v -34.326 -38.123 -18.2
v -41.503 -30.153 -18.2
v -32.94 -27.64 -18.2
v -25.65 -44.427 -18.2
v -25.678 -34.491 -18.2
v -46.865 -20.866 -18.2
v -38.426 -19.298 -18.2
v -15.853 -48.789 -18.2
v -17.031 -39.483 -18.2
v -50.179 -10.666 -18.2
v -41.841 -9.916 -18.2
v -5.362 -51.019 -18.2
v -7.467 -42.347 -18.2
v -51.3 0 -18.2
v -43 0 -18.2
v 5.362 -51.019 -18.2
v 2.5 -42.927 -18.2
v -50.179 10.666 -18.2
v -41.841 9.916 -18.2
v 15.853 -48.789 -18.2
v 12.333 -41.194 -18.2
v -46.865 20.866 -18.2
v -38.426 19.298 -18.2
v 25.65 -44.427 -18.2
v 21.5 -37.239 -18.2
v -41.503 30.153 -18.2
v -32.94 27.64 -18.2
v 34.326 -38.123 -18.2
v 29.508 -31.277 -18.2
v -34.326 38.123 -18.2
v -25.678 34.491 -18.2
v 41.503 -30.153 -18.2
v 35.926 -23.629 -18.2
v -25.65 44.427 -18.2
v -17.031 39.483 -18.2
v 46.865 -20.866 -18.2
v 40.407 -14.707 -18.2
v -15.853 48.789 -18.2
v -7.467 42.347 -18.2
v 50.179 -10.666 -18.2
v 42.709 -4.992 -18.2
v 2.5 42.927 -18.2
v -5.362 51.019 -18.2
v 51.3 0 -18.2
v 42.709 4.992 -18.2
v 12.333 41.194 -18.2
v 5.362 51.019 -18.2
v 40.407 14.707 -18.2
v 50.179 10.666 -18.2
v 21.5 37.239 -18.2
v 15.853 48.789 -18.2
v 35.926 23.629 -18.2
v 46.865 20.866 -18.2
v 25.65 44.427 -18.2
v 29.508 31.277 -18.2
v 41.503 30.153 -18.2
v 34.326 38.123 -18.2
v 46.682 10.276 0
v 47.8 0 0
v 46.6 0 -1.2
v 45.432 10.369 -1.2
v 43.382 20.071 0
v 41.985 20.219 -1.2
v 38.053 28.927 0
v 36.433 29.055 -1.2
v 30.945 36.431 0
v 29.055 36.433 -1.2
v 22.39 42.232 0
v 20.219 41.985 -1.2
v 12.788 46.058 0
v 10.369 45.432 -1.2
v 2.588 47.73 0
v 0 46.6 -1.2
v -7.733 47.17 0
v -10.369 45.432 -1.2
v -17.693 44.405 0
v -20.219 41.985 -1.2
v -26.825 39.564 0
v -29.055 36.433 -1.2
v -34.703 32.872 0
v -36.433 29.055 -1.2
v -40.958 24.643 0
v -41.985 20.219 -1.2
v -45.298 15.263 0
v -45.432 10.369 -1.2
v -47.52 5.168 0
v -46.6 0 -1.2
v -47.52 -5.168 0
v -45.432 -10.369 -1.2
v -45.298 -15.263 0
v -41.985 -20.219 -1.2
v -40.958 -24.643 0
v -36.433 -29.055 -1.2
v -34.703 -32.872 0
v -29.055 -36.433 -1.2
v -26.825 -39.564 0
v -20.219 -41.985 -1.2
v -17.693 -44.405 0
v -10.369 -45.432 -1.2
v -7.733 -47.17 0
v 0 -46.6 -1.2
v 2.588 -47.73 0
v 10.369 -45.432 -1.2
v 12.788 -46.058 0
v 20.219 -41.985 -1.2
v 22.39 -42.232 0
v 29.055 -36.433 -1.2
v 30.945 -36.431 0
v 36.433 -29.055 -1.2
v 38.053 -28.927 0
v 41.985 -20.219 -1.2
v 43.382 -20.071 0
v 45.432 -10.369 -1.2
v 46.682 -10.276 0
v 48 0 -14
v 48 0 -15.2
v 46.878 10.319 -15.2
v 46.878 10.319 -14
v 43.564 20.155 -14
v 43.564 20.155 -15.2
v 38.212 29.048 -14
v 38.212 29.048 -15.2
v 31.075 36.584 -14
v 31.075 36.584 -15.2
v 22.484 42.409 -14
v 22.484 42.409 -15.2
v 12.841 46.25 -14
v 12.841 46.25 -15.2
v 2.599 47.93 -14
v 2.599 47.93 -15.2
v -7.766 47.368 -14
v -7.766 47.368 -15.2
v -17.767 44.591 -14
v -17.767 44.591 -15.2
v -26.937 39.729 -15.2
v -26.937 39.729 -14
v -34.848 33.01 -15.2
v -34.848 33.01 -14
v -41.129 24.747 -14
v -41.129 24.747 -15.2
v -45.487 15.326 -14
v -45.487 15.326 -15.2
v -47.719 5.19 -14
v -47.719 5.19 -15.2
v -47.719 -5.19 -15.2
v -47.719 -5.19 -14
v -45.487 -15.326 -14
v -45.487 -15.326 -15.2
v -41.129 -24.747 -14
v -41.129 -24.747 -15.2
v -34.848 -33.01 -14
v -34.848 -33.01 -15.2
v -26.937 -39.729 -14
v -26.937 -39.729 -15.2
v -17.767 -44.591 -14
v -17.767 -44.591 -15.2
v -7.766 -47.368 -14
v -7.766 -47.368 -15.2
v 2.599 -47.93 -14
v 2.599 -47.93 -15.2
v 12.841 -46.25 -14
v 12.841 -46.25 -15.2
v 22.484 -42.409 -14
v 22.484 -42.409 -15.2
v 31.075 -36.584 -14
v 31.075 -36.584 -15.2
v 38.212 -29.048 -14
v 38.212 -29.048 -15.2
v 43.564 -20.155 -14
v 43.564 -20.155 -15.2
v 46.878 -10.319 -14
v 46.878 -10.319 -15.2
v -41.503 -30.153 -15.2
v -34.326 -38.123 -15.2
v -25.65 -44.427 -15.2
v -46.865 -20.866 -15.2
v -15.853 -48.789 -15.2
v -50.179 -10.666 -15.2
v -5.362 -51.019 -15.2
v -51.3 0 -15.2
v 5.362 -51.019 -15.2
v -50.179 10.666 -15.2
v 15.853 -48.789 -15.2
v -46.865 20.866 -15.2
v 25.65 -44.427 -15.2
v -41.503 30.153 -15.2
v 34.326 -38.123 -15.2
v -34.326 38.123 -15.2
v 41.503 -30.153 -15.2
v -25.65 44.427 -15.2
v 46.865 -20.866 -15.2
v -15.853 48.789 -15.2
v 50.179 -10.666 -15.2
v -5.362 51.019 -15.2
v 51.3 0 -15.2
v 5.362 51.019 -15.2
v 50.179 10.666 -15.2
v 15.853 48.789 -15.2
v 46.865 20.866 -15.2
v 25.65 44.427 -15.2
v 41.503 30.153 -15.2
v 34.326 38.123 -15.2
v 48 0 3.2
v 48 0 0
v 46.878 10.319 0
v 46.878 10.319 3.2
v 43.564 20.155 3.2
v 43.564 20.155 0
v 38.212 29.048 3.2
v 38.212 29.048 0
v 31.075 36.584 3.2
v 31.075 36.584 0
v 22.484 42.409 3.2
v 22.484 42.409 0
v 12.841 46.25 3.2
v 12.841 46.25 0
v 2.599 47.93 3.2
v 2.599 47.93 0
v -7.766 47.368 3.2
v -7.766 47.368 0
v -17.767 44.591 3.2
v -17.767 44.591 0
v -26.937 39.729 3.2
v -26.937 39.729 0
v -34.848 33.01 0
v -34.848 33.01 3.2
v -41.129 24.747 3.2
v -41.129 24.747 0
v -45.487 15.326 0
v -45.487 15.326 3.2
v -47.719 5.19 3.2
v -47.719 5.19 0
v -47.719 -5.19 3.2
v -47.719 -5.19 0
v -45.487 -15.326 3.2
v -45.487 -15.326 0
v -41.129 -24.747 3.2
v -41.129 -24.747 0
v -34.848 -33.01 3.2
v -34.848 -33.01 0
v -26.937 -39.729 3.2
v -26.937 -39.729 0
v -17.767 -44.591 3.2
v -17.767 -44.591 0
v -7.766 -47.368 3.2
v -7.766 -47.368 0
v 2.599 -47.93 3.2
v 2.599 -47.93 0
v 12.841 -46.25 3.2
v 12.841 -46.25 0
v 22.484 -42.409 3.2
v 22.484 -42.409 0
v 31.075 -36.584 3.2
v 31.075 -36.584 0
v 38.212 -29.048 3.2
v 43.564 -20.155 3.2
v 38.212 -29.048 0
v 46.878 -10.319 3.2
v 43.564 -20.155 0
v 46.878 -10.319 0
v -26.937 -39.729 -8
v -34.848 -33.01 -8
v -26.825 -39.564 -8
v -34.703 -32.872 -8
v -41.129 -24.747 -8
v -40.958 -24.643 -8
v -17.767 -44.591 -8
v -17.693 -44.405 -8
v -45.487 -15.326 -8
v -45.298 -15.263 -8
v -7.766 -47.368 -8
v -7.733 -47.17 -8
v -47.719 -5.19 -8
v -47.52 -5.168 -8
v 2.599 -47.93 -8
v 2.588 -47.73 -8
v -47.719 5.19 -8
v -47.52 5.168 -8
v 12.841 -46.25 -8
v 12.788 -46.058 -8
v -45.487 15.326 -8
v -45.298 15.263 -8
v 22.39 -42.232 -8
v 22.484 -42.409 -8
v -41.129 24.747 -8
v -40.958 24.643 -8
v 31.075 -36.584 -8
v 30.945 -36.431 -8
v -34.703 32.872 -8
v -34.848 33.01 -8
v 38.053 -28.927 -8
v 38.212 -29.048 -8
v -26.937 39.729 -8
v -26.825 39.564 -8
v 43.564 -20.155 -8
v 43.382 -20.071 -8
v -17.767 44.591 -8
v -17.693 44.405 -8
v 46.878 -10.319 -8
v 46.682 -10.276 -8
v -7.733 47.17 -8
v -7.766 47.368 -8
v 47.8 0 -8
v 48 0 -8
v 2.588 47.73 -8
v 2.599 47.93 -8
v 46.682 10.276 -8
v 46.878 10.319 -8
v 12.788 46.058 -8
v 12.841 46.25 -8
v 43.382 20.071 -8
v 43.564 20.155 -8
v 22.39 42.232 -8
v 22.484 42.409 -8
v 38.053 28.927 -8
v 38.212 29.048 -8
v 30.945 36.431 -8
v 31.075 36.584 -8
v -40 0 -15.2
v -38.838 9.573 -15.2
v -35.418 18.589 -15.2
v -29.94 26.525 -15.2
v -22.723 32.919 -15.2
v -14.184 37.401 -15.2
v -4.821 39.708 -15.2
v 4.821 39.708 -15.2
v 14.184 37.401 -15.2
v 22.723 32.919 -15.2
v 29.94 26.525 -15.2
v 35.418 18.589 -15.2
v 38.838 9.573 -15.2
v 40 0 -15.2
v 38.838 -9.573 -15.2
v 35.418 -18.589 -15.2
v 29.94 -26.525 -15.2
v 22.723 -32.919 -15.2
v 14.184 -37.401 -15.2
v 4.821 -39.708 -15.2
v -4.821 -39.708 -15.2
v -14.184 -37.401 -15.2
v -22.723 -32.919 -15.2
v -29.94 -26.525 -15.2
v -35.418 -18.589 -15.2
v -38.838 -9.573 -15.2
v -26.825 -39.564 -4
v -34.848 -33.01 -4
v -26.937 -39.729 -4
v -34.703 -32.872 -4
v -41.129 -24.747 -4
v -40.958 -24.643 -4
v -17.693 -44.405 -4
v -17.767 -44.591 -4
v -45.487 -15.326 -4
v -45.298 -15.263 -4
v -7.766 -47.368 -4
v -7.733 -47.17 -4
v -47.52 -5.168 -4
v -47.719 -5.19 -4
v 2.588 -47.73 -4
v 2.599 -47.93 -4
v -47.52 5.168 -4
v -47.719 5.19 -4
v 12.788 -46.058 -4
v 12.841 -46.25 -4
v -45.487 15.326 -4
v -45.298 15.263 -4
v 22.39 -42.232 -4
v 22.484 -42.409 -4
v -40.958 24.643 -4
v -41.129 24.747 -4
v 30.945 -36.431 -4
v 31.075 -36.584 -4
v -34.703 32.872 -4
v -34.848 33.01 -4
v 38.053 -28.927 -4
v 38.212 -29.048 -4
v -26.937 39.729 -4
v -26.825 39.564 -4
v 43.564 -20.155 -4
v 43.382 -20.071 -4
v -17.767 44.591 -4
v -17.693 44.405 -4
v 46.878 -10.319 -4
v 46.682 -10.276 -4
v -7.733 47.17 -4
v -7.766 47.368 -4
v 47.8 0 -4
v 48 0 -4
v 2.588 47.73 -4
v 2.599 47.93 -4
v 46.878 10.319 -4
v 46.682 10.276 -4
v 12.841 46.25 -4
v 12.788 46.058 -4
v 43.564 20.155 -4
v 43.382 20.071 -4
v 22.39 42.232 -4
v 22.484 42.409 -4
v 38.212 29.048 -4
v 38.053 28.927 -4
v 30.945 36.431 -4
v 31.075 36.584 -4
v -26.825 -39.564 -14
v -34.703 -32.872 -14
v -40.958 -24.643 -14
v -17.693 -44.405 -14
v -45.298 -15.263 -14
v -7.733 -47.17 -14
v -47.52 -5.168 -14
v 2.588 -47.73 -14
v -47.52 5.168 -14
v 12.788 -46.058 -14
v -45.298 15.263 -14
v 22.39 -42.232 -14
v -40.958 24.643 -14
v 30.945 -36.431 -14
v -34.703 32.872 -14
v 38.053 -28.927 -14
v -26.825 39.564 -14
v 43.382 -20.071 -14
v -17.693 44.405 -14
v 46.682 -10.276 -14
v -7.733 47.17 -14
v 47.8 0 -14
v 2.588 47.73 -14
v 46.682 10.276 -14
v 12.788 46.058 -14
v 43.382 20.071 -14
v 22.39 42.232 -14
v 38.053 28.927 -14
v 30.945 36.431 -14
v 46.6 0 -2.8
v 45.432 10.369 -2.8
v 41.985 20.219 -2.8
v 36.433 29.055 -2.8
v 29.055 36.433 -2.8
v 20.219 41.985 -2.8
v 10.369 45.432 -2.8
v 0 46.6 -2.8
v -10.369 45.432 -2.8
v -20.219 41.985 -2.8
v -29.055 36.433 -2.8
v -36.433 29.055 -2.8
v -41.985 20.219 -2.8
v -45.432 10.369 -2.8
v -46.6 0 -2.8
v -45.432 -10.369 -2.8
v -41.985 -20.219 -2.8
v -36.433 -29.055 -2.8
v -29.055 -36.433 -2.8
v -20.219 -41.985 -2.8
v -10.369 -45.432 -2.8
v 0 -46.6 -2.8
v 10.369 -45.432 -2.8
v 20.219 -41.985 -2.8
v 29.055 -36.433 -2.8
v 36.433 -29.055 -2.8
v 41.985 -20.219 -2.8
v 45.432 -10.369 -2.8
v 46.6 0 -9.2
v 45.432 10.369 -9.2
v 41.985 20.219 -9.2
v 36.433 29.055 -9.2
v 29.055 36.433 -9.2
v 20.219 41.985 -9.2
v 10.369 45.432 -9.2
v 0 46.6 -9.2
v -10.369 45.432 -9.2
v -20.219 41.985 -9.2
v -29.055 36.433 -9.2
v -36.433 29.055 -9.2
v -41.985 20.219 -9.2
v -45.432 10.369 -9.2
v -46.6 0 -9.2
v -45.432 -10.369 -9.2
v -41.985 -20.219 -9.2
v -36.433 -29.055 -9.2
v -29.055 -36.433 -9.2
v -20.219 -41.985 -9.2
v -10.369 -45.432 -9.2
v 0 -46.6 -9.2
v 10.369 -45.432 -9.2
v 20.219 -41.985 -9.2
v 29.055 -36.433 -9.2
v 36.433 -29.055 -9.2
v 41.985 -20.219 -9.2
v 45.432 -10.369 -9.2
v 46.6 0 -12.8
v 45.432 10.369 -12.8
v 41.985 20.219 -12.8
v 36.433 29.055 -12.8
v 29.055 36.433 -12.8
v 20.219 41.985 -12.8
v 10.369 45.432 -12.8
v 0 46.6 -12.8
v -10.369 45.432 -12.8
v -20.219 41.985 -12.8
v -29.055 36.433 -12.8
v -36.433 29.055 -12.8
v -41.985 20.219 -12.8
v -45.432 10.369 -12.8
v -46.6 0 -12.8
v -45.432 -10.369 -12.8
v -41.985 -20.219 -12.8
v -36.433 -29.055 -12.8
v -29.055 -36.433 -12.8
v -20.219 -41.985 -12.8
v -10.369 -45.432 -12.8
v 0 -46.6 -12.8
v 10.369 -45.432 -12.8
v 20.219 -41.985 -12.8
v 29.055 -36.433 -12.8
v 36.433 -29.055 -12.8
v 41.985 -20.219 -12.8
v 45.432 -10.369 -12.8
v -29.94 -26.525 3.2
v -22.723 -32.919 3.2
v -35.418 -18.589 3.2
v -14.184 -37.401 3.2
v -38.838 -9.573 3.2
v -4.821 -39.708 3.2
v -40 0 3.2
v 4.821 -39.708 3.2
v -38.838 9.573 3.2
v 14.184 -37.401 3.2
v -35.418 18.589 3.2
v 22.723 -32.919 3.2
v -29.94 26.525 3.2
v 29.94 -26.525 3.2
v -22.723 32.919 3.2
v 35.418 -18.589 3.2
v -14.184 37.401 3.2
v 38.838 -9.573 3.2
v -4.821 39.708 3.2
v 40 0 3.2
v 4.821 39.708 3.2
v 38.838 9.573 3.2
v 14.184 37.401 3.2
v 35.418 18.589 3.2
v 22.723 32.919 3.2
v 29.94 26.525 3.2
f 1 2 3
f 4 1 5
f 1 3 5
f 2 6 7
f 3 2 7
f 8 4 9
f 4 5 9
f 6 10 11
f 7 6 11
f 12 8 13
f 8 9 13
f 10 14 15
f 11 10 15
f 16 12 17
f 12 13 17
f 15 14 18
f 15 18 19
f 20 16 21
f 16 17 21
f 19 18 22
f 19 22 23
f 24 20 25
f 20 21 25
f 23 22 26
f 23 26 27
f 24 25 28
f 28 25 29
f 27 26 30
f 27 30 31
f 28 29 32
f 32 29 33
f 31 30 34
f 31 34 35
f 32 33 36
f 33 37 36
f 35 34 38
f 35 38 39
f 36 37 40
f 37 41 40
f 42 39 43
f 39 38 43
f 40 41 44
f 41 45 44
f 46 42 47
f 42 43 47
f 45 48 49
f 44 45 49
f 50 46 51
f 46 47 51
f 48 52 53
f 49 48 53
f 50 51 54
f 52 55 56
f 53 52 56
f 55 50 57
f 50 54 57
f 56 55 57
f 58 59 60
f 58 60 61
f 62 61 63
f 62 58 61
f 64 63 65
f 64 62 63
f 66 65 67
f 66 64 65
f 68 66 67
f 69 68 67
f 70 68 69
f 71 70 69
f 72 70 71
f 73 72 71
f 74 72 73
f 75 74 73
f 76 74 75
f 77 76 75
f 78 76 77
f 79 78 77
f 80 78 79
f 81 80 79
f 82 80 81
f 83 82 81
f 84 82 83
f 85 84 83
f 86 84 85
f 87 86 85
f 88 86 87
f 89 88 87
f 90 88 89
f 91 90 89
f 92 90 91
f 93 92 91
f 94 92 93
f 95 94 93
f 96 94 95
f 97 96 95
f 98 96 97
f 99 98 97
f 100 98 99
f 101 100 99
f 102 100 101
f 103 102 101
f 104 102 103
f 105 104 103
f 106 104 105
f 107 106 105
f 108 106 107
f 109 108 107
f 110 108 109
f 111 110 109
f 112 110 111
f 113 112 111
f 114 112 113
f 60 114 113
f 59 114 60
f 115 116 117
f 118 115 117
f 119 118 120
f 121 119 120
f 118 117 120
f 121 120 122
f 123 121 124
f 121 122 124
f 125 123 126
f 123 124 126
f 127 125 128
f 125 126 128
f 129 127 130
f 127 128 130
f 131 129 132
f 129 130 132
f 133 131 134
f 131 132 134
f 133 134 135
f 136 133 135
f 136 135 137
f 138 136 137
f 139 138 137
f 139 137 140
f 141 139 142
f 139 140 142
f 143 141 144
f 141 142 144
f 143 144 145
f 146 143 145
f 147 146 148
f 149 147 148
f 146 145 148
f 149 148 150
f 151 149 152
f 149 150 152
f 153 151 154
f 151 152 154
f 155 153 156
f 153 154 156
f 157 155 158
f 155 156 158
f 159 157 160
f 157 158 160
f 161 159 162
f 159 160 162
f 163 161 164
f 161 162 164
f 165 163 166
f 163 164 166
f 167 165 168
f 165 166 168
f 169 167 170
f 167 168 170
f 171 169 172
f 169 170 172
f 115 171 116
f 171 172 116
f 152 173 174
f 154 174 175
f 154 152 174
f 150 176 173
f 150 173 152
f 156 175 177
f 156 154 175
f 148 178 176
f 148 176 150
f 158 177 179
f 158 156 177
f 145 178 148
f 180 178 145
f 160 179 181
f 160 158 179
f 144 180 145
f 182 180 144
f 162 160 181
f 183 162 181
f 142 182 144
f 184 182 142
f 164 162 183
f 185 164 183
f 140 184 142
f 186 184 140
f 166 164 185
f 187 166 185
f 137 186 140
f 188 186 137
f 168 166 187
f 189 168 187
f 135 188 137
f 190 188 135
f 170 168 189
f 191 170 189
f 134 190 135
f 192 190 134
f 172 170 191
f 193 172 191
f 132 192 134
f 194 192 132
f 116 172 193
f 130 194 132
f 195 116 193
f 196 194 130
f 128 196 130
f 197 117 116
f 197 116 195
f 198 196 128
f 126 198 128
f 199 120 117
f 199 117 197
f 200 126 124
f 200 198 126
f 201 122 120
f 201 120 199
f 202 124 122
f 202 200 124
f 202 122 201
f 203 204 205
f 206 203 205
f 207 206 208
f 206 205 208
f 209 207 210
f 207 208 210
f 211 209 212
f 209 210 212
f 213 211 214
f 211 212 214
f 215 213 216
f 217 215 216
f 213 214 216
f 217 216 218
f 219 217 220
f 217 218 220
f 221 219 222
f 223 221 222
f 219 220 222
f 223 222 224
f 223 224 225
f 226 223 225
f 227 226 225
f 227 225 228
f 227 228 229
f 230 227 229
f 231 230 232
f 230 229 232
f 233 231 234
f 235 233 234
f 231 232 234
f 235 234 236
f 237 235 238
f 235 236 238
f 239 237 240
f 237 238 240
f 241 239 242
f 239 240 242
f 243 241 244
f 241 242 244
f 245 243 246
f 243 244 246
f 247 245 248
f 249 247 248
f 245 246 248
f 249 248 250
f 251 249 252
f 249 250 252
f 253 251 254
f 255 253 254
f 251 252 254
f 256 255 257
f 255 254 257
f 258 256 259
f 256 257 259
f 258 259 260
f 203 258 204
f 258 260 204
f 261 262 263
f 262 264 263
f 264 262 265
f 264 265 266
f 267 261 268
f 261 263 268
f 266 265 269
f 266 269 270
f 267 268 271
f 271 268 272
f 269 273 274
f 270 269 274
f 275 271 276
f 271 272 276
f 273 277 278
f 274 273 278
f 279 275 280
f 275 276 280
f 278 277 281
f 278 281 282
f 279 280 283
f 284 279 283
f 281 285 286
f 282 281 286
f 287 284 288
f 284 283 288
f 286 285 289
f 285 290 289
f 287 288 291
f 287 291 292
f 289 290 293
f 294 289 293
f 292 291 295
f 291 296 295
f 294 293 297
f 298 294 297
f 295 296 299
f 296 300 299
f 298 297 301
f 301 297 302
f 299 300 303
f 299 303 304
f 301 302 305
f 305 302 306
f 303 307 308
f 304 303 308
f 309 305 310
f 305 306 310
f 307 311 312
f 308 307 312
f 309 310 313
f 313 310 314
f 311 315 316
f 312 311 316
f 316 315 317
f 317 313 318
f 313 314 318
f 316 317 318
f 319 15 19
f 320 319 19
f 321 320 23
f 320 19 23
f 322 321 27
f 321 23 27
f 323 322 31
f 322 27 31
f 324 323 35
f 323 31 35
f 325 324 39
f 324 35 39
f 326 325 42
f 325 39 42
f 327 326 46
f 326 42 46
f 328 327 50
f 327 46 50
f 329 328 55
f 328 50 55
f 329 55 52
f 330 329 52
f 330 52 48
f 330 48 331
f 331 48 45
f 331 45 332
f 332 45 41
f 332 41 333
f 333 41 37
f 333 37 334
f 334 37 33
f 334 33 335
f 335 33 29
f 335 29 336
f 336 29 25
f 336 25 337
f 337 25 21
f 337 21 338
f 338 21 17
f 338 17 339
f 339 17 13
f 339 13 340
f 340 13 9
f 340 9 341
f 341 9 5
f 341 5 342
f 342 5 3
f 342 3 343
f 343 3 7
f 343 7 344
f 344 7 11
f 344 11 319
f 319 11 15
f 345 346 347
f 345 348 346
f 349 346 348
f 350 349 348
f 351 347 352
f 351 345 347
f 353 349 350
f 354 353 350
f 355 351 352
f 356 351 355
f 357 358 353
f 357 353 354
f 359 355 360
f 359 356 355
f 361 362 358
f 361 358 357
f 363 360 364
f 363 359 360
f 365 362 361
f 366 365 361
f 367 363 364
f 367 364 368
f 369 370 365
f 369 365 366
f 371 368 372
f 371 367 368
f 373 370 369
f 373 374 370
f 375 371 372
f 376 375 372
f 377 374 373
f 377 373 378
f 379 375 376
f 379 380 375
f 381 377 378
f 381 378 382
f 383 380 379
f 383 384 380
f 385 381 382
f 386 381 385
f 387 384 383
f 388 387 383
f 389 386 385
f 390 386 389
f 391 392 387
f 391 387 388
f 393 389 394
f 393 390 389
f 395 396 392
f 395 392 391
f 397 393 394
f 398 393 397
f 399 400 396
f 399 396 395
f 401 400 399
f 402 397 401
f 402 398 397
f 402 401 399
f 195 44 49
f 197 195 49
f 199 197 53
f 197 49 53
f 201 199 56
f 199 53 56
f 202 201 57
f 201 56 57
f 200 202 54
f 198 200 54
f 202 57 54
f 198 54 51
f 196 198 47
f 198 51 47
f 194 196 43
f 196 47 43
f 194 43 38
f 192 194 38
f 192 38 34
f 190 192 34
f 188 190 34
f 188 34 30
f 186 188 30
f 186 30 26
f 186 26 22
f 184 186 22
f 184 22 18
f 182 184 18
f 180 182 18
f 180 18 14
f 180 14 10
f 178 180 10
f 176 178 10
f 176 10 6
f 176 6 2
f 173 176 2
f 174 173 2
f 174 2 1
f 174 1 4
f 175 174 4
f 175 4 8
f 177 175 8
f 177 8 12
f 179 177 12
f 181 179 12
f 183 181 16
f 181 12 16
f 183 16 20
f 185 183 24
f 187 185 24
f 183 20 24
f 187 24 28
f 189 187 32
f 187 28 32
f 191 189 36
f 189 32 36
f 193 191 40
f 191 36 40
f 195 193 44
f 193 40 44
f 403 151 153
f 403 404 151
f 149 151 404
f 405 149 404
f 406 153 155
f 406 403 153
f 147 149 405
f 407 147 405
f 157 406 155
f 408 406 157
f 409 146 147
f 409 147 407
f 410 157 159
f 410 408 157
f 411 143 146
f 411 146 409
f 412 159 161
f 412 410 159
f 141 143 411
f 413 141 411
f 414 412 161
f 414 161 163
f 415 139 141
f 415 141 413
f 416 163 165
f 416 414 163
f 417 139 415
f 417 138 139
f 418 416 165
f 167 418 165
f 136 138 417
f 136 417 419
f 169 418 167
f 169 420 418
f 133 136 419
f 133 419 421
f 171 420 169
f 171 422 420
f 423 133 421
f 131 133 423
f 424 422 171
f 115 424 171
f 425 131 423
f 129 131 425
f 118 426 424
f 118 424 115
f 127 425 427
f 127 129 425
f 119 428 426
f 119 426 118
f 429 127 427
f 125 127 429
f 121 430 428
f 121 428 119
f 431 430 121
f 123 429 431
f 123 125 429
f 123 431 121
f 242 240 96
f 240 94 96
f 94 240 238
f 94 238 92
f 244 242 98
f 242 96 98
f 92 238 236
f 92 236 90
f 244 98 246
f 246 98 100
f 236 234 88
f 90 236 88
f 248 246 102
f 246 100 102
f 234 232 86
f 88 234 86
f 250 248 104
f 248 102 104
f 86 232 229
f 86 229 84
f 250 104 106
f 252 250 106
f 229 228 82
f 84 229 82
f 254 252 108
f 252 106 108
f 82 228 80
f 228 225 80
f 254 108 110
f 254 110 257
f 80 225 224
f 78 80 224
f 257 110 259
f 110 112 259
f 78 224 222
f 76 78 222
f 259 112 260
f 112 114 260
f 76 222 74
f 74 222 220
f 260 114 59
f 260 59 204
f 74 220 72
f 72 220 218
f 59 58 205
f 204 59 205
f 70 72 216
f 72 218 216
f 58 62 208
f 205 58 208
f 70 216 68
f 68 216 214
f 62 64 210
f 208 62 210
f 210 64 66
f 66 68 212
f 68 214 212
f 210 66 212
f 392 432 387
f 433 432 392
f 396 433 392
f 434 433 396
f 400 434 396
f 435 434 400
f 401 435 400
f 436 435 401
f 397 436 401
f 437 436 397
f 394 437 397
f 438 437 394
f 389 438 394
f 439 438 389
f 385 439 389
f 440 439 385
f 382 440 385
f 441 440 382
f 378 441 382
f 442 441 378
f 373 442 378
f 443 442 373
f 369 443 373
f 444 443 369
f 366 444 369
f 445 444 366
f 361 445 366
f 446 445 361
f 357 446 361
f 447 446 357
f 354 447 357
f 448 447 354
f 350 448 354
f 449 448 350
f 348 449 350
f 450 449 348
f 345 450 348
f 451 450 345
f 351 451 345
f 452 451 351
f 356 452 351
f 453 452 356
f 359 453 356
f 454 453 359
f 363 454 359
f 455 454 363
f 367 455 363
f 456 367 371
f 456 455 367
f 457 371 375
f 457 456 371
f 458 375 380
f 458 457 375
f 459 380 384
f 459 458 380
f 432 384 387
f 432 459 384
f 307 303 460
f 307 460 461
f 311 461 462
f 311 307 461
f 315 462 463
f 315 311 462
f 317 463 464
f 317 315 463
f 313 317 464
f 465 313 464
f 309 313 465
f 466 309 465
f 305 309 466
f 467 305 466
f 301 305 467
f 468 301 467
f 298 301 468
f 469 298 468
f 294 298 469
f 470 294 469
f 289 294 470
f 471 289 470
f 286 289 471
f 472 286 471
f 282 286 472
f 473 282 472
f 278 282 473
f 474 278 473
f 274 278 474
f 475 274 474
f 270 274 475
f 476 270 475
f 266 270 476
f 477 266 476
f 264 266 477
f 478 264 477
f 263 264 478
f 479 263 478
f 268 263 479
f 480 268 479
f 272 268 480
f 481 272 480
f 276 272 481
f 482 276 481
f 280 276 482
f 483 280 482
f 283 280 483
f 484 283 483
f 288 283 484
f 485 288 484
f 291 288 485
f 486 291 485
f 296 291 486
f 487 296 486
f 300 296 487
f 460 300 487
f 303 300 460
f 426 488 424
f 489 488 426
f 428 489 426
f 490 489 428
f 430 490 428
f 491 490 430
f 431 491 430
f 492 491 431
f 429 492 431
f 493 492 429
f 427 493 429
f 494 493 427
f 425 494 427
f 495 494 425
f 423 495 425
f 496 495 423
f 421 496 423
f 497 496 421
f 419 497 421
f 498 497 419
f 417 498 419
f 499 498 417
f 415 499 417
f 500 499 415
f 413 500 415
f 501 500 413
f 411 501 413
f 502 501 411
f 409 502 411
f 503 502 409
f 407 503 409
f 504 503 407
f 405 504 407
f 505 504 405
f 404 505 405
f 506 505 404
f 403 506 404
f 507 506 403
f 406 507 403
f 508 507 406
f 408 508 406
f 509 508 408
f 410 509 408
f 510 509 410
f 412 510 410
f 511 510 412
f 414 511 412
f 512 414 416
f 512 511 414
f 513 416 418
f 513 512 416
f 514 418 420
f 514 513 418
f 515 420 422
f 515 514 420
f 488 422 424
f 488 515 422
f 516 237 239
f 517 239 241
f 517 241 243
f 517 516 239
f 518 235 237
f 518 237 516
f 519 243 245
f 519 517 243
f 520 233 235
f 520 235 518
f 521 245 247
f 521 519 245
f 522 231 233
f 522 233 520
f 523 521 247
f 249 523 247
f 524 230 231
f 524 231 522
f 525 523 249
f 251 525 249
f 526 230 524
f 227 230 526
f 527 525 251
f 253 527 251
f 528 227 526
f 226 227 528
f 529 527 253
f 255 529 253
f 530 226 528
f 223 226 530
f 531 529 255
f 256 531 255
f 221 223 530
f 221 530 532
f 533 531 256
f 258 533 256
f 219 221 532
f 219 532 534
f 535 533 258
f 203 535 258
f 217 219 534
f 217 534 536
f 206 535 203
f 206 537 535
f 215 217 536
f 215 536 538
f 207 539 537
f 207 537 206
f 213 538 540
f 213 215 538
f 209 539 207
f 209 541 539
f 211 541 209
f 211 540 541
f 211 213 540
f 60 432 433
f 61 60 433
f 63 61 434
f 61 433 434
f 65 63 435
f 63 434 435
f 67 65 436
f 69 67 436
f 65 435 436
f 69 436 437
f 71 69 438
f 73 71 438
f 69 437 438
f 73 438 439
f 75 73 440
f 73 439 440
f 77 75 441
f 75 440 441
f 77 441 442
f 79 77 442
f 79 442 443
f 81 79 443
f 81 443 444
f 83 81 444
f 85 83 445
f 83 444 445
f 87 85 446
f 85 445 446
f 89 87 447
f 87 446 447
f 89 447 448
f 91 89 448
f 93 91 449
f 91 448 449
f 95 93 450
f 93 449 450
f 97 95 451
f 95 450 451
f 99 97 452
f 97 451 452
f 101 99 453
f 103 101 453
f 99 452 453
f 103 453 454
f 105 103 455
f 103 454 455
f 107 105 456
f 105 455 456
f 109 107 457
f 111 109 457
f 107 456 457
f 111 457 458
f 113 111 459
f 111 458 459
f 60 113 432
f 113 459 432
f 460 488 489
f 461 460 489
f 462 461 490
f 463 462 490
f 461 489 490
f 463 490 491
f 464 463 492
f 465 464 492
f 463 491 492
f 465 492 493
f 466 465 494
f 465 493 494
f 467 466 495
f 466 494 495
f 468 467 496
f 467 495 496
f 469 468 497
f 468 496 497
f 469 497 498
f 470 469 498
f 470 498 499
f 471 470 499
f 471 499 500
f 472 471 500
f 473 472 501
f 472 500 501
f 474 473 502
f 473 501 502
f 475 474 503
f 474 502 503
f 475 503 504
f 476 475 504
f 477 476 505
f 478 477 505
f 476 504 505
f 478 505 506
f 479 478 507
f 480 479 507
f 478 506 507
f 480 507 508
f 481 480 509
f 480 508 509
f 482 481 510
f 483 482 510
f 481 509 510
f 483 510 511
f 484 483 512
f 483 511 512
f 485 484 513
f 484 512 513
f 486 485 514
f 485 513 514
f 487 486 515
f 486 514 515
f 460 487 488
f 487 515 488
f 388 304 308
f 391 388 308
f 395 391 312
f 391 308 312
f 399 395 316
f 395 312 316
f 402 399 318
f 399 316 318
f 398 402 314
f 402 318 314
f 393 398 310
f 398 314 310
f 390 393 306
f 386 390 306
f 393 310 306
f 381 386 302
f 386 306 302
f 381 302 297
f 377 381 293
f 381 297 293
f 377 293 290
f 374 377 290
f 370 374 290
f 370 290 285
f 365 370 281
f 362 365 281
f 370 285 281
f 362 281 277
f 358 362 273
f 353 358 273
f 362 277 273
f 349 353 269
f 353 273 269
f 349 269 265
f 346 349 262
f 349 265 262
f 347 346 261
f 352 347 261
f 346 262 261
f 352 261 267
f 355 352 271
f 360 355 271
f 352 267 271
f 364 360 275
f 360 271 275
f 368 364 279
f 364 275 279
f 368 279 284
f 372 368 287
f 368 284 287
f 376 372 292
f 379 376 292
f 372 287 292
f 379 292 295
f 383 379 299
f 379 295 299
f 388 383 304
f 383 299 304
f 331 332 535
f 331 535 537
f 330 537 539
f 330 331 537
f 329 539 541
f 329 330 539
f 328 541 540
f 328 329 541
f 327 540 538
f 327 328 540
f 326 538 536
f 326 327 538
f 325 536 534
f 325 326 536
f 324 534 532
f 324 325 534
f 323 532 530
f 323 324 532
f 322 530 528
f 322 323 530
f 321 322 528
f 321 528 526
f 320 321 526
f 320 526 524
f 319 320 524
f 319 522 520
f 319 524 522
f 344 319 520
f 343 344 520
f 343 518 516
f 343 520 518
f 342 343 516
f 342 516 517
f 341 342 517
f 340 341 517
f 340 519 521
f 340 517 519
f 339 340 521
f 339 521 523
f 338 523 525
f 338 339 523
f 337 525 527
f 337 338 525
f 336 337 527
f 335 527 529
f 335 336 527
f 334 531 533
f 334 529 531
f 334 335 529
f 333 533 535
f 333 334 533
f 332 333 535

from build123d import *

# Parameters (mm, degrees)
CYLINDER039_R     = 68.3
CYLINDER039_DEPTH = 5
CYLINDER036_R     = 40
CYLINDER036_DEPTH = 27.4
CYLINDER035_R     = 45
CYLINDER035_DEPTH = 23.4
CYLINDER033_R     = 45
CYLINDER033_DEPTH = 25
CYLINDER032_R     = 48
CYLINDER032_DEPTH = 3.2
CYLINDER029_R     = 46.6
CYLINDER029_DEPTH = 6
CYLINDER038_R     = 46.6
CYLINDER038_DEPTH = 4
CYLINDER030_R     = 48
CYLINDER030_DEPTH = 4
CYLINDER037_R     = 48
CYLINDER037_DEPTH = 1.2
CYLINDER031_R     = 45
CYLINDER031_DEPTH = 25
CYLINDER034_R     = 51.3
CYLINDER034_DEPTH = 5
CHAMFER003_SIZE   = 1.2
CHAMFER002_SIZE   = 1.2


with BuildPart() as ajustar_radio_de_este004:
    # Cylinder039 → Cylinder039 (new body)
    with BuildSketch(Plane.XY.offset(-23.2)):
        Circle(CYLINDER039_R)
    extrude(amount=CYLINDER039_DEPTH)


with BuildPart() as cone002:
    # Cone002 → Cone002 (revolve)
    with BuildSketch(Plane(origin=(0, 0, -15.2), x_dir=(-1, 0, 0), z_dir=(0, -1, 0))):
        Polygon((0, 0), (40, 0), (45, 5), (0, 5), align=None)
    revolve(axis=Axis((0, 0, -15.2), (0, 0, -1)))


with BuildPart() as fusion010:
    # Cylinder036 → Cylinder036 (new body)
    with BuildSketch(Plane.XY.offset(-17)):
        Circle(CYLINDER036_R)
    extrude(amount=CYLINDER036_DEPTH)

    # Fusion010: union Cone002
    add(cone002.part)


with BuildPart() as cut015:
    # Cylinder035 → Cylinder035 (new body)
    with BuildSketch(Plane.XY.offset(-20.2)):
        Circle(CYLINDER035_R)
    extrude(amount=CYLINDER035_DEPTH)

    # Cut015: cut Fusion010
    add(fusion010.part, mode=Mode.SUBTRACT)


with BuildPart() as cylinder033:
    # Cylinder033 → Cylinder033 (new body)
    with BuildSketch(Plane.XY.offset(-18)):
        Circle(CYLINDER033_R)
    extrude(amount=CYLINDER033_DEPTH)


with BuildPart() as cylinder032:
    # Cylinder032 → Cylinder032 (new body)
    with BuildSketch(Plane.XY):
        Circle(CYLINDER032_R)
    extrude(amount=CYLINDER032_DEPTH)


with BuildPart() as cylinder029:
    # Cylinder029 → Cylinder029 (new body)
    with BuildSketch(Plane.XY.offset(-14)):
        Circle(CYLINDER029_R)
    extrude(amount=CYLINDER029_DEPTH)


with BuildPart() as cylinder038:
    # Cylinder038 → Cylinder038 (new body)
    with BuildSketch(Plane.XY.offset(-4)):
        Circle(CYLINDER038_R)
    extrude(amount=CYLINDER038_DEPTH)


with BuildPart() as cylinder030:
    # Cylinder030 → Cylinder030 (new body)
    with BuildSketch(Plane.XY.offset(-8)):
        Circle(CYLINDER030_R)
    extrude(amount=CYLINDER030_DEPTH)


with BuildPart() as cut016:
    # Cylinder037 → Cylinder037 (new body)
    with BuildSketch(Plane.XY.offset(-15.2)):
        Circle(CYLINDER037_R)
    extrude(amount=CYLINDER037_DEPTH)

    # Fusion012: union Cylinder032, Cylinder029, Cylinder038, Cylinder030
    add(cylinder032.part)
    add(cylinder029.part)
    add(cylinder038.part)
    add(cylinder030.part)

    # Cut016: cut Cylinder033
    add(cylinder033.part, mode=Mode.SUBTRACT)


with BuildPart() as cylinder031:
    # Cylinder031 → Cylinder031 (new body)
    with BuildSketch(Plane.XY.offset(-23)):
        Circle(CYLINDER031_R)
    extrude(amount=CYLINDER031_DEPTH)


with BuildPart() as cut014:
    # Cylinder034 → Cylinder034 (new body)
    with BuildSketch(Plane.XY.offset(-20.2)):
        Circle(CYLINDER034_R)
    extrude(amount=CYLINDER034_DEPTH)

    # Cut017: cut Cylinder031
    add(cylinder031.part, mode=Mode.SUBTRACT)

    # Fusion009: union Cut016
    add(cut016.part)

    # Fusion011: union Cut015
    add(cut015.part)

    # Chamfer003
    chamfer003_edges = [cut014.edges().sort_by_distance(p)[0] for p in [
        (-46.6, 0, -14),
        (-46.6, 0, -4),
    ]]
    chamfer(chamfer003_edges, length=CHAMFER003_SIZE)

    # Chamfer002
    chamfer002_edges = [cut014.edges().sort_by_distance(p)[0] for p in [
        (-46.6, 0, -8),
        (-46.6, 0, 0),
    ]]
    chamfer(chamfer002_edges, length=CHAMFER002_SIZE)

    # Cut014: cut ajustar_radio_de_este004
    add(ajustar_radio_de_este004.part, mode=Mode.SUBTRACT)


solid = cut014.part
